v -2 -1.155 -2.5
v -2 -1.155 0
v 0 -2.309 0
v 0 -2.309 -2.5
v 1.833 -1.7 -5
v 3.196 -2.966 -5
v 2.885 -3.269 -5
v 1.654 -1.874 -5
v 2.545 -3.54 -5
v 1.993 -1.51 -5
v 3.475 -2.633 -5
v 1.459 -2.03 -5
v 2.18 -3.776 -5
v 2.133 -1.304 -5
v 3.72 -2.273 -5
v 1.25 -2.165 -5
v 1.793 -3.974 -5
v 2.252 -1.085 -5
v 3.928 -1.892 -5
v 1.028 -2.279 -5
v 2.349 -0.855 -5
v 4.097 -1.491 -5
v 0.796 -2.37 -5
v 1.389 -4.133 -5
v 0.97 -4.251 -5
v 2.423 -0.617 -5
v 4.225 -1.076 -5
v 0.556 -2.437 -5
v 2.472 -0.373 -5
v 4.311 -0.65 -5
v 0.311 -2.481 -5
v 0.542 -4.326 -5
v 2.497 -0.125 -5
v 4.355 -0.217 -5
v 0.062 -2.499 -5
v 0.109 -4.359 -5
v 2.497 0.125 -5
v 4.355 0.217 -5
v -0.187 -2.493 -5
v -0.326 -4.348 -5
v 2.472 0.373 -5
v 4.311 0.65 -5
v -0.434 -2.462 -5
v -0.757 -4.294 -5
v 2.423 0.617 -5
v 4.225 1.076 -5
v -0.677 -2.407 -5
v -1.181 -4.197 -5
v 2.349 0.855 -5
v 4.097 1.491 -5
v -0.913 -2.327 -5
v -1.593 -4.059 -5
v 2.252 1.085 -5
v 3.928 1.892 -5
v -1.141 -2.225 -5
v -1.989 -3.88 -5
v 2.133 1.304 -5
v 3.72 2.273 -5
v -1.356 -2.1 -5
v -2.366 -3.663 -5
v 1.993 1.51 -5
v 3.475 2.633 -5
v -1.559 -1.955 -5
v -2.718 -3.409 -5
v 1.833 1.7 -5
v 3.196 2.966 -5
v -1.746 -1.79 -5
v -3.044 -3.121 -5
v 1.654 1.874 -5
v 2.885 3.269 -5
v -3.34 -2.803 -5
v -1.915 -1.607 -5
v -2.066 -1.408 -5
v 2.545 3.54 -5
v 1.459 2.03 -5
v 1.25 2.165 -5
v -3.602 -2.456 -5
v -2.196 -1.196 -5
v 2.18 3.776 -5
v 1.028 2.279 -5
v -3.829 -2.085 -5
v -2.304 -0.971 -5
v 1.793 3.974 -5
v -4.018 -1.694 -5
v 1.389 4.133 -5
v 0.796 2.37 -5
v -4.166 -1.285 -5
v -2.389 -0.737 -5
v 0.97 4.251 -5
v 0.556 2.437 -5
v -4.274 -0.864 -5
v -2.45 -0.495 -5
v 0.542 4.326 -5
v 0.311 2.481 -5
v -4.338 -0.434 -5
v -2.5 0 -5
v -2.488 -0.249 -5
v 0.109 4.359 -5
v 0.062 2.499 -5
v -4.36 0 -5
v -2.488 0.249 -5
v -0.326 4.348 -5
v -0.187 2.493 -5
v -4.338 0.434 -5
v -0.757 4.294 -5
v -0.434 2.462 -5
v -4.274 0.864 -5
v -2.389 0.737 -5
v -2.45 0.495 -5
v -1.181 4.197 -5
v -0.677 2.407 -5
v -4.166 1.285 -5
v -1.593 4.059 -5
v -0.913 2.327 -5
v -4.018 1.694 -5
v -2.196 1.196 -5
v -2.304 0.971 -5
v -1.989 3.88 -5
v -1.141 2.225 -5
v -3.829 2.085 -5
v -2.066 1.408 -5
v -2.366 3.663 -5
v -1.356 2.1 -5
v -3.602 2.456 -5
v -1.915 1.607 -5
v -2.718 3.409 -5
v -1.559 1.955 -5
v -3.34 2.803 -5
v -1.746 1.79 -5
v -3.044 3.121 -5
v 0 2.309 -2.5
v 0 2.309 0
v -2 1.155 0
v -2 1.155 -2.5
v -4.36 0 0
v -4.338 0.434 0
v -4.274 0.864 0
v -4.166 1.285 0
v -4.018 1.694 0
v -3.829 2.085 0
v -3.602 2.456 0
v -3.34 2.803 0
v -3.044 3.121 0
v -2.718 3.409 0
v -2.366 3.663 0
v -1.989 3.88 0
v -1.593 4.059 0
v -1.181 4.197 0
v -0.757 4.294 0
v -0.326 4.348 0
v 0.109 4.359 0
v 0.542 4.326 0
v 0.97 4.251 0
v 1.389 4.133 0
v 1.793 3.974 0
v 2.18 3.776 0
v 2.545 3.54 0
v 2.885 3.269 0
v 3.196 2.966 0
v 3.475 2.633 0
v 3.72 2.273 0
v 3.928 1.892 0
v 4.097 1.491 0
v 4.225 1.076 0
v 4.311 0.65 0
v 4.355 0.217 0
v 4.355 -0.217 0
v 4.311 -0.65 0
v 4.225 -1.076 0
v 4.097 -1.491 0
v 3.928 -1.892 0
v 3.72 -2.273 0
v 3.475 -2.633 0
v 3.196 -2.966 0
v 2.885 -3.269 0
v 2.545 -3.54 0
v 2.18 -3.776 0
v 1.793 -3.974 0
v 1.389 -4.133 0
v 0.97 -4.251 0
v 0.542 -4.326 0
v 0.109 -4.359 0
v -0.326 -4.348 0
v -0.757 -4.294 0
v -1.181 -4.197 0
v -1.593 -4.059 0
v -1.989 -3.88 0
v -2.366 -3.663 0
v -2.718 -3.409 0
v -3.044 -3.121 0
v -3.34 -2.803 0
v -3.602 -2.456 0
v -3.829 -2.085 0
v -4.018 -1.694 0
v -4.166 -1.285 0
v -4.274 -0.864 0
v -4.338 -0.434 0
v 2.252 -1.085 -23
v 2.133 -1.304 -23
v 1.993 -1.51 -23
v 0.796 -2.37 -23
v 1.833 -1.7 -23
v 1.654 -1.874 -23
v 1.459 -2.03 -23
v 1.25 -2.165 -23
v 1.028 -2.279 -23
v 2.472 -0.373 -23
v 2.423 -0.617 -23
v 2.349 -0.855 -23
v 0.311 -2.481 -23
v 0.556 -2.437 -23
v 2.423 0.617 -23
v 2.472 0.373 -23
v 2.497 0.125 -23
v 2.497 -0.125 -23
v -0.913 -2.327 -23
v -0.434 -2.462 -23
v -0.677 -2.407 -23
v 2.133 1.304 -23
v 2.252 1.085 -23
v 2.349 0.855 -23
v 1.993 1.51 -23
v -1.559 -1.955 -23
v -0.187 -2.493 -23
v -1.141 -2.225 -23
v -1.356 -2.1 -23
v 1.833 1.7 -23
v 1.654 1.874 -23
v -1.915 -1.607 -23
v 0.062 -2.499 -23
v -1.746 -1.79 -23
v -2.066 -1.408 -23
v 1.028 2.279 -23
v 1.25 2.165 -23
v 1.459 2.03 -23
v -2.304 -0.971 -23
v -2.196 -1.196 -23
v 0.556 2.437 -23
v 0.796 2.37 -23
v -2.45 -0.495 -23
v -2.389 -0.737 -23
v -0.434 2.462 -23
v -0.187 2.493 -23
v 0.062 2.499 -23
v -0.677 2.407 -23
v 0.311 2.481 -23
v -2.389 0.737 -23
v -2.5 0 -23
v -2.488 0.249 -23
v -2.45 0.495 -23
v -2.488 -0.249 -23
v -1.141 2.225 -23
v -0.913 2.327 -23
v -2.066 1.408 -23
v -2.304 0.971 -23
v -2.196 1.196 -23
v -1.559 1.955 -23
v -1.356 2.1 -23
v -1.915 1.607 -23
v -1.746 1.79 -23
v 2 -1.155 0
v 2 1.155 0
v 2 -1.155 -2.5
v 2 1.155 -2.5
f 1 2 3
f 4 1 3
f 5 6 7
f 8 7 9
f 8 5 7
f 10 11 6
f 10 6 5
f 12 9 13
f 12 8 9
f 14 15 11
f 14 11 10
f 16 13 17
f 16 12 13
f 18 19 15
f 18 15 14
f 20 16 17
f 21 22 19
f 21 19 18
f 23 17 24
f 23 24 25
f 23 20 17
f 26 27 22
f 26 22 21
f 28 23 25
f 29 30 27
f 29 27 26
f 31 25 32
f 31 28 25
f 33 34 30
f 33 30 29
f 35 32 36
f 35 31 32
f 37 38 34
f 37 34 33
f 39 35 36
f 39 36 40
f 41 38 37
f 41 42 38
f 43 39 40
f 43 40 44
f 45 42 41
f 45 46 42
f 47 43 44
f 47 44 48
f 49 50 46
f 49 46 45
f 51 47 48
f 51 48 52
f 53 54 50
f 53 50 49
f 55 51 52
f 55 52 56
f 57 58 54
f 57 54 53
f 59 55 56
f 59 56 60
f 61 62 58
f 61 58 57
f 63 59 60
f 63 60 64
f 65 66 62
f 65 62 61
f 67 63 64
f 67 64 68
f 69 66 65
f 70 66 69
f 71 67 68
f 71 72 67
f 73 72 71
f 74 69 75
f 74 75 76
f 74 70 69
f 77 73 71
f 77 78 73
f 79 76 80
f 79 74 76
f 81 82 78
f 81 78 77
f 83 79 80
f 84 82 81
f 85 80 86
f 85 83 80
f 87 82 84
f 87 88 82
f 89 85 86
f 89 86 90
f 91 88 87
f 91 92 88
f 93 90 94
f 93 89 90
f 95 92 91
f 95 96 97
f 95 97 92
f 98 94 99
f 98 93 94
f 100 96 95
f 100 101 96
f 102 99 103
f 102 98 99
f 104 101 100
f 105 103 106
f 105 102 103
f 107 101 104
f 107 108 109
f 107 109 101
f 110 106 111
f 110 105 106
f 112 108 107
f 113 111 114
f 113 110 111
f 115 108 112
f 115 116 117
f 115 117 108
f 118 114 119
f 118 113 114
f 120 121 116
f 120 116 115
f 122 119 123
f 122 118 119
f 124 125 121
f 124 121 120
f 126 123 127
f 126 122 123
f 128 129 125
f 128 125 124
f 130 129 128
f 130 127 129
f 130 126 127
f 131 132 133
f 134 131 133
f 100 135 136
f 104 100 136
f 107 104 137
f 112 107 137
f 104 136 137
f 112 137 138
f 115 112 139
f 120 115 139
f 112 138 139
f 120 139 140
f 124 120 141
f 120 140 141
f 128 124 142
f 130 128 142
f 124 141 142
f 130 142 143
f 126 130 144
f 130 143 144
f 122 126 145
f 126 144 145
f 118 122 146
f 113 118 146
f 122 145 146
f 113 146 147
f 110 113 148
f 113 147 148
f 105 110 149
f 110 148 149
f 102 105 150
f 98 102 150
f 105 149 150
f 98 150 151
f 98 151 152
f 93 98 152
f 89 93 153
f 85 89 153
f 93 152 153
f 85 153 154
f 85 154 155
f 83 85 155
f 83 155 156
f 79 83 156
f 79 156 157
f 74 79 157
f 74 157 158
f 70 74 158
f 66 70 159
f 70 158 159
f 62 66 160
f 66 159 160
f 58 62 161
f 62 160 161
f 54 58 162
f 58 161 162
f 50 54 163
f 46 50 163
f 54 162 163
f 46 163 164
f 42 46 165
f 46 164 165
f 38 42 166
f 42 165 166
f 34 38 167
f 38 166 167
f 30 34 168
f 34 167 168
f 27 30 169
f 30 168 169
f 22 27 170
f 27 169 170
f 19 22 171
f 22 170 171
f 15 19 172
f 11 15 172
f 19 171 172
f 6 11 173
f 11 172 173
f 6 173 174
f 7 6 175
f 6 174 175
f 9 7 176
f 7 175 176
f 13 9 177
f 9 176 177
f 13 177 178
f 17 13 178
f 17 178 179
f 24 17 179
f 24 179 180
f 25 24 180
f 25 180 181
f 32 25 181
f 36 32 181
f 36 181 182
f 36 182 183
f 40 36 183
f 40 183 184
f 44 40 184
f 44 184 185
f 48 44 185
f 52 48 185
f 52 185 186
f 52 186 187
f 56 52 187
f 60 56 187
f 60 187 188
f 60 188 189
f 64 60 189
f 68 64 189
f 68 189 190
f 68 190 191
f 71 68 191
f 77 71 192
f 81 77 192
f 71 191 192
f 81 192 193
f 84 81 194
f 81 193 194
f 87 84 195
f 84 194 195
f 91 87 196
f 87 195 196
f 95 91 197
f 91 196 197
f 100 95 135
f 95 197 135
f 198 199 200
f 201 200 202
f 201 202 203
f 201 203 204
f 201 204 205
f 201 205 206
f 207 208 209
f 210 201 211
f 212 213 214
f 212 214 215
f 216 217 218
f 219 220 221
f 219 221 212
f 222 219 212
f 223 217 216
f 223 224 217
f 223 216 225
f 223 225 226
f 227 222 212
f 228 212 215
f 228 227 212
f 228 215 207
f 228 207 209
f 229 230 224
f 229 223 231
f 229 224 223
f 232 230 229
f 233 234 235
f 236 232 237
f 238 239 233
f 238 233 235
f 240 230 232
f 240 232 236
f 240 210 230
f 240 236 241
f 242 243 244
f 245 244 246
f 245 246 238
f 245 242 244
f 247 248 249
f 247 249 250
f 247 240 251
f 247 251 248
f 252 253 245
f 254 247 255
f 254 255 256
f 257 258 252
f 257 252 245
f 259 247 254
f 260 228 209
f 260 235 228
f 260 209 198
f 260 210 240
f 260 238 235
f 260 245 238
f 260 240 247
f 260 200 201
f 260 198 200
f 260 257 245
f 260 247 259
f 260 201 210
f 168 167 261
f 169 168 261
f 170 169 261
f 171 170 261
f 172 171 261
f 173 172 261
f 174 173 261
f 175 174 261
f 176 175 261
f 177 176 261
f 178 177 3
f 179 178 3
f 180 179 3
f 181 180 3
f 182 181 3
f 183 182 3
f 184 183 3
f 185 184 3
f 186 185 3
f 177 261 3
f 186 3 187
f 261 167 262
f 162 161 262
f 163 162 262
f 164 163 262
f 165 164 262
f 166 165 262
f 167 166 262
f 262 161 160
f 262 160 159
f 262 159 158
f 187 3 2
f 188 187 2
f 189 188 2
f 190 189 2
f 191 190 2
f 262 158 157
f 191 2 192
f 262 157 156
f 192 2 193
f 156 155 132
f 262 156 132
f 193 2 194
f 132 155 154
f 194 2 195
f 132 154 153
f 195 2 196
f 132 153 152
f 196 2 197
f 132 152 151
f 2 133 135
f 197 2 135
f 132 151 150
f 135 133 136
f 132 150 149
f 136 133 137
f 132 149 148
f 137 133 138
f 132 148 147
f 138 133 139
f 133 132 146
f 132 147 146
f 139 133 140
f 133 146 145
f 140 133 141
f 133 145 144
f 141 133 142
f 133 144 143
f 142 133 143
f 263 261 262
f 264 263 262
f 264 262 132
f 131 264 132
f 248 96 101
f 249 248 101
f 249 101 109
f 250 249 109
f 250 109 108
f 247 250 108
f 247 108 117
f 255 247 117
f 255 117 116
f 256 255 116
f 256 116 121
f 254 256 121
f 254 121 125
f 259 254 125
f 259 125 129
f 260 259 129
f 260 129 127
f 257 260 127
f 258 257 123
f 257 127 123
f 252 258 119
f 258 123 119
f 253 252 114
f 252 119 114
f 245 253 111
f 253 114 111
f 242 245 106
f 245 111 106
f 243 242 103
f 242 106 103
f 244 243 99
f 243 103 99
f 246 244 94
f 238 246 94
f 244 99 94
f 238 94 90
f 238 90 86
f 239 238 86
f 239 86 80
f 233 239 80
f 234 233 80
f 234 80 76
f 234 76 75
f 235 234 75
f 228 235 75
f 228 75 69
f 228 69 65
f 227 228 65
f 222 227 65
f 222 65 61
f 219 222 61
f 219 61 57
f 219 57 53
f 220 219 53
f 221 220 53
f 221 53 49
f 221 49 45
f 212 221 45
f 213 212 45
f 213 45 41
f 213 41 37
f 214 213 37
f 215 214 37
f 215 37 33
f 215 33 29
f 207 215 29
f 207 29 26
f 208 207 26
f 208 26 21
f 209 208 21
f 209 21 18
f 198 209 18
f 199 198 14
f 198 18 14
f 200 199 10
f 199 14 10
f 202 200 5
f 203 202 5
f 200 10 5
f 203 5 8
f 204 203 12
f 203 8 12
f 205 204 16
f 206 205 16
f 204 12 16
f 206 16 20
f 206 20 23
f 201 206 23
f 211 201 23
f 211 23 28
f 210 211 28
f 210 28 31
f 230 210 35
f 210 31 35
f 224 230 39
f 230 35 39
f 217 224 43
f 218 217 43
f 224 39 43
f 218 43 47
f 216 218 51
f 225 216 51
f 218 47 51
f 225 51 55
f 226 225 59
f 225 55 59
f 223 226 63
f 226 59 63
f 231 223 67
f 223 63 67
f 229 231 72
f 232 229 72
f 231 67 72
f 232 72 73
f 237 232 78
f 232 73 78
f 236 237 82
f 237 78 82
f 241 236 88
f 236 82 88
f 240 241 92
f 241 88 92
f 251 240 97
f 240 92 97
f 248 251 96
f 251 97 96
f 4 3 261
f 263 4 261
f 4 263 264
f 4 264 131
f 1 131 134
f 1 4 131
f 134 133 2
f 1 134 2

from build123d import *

# Parameters (mm, degrees)
CYLINDER015_R                      = 2.5
CYLINDER015_DEPTH                  = 23
CYLINDER014_R                      = 4.36
CYLINDER014_DEPTH                  = 5
FUSION001018017018_PLACEMENT_ANGLE = 180
POCKET002018004_DEPTH              = 2.5


with BuildPart() as cylinder015:
    # Cylinder015 → Cylinder015 (new body)
    with BuildSketch(Plane.XY):
        Circle(CYLINDER015_R)
    extrude(amount=CYLINDER015_DEPTH)


with BuildPart() as zylinderkopfschraube_m5x18_isk:
    # Cylinder014 → Cylinder014 (new body)
    with BuildSketch(Plane.XY):
        Circle(CYLINDER014_R)
    extrude(amount=CYLINDER014_DEPTH)

    # Fusion001018017018: union Cylinder015
    add(cylinder015.part)


with BuildPart() as zylinderkopfschraube_m5x18_isk_1:
    # Fusion001018017018 placement: moved
    add(zylinderkopfschraube_m5x18_isk.part.rotate(Axis((0, 0, 0), (0, 1, 0)), FUSION001018017018_PLACEMENT_ANGLE))

    # Sketch020 → Pocket002018004 (cut)
    with BuildSketch(Plane(origin=(0, 0, 0), x_dir=(-1, 0, 0), z_dir=(0, 0, 1))):
        Polygon((2, -1.154701), (2, 1.154701), (0, 2.309401), (-2, 1.154701), (-2, -1.154701), (0, -2.309401), align=None)
    extrude(amount=-POCKET002018004_DEPTH, mode=Mode.SUBTRACT)


solid = zylinderkopfschraube_m5x18_isk_1.part
